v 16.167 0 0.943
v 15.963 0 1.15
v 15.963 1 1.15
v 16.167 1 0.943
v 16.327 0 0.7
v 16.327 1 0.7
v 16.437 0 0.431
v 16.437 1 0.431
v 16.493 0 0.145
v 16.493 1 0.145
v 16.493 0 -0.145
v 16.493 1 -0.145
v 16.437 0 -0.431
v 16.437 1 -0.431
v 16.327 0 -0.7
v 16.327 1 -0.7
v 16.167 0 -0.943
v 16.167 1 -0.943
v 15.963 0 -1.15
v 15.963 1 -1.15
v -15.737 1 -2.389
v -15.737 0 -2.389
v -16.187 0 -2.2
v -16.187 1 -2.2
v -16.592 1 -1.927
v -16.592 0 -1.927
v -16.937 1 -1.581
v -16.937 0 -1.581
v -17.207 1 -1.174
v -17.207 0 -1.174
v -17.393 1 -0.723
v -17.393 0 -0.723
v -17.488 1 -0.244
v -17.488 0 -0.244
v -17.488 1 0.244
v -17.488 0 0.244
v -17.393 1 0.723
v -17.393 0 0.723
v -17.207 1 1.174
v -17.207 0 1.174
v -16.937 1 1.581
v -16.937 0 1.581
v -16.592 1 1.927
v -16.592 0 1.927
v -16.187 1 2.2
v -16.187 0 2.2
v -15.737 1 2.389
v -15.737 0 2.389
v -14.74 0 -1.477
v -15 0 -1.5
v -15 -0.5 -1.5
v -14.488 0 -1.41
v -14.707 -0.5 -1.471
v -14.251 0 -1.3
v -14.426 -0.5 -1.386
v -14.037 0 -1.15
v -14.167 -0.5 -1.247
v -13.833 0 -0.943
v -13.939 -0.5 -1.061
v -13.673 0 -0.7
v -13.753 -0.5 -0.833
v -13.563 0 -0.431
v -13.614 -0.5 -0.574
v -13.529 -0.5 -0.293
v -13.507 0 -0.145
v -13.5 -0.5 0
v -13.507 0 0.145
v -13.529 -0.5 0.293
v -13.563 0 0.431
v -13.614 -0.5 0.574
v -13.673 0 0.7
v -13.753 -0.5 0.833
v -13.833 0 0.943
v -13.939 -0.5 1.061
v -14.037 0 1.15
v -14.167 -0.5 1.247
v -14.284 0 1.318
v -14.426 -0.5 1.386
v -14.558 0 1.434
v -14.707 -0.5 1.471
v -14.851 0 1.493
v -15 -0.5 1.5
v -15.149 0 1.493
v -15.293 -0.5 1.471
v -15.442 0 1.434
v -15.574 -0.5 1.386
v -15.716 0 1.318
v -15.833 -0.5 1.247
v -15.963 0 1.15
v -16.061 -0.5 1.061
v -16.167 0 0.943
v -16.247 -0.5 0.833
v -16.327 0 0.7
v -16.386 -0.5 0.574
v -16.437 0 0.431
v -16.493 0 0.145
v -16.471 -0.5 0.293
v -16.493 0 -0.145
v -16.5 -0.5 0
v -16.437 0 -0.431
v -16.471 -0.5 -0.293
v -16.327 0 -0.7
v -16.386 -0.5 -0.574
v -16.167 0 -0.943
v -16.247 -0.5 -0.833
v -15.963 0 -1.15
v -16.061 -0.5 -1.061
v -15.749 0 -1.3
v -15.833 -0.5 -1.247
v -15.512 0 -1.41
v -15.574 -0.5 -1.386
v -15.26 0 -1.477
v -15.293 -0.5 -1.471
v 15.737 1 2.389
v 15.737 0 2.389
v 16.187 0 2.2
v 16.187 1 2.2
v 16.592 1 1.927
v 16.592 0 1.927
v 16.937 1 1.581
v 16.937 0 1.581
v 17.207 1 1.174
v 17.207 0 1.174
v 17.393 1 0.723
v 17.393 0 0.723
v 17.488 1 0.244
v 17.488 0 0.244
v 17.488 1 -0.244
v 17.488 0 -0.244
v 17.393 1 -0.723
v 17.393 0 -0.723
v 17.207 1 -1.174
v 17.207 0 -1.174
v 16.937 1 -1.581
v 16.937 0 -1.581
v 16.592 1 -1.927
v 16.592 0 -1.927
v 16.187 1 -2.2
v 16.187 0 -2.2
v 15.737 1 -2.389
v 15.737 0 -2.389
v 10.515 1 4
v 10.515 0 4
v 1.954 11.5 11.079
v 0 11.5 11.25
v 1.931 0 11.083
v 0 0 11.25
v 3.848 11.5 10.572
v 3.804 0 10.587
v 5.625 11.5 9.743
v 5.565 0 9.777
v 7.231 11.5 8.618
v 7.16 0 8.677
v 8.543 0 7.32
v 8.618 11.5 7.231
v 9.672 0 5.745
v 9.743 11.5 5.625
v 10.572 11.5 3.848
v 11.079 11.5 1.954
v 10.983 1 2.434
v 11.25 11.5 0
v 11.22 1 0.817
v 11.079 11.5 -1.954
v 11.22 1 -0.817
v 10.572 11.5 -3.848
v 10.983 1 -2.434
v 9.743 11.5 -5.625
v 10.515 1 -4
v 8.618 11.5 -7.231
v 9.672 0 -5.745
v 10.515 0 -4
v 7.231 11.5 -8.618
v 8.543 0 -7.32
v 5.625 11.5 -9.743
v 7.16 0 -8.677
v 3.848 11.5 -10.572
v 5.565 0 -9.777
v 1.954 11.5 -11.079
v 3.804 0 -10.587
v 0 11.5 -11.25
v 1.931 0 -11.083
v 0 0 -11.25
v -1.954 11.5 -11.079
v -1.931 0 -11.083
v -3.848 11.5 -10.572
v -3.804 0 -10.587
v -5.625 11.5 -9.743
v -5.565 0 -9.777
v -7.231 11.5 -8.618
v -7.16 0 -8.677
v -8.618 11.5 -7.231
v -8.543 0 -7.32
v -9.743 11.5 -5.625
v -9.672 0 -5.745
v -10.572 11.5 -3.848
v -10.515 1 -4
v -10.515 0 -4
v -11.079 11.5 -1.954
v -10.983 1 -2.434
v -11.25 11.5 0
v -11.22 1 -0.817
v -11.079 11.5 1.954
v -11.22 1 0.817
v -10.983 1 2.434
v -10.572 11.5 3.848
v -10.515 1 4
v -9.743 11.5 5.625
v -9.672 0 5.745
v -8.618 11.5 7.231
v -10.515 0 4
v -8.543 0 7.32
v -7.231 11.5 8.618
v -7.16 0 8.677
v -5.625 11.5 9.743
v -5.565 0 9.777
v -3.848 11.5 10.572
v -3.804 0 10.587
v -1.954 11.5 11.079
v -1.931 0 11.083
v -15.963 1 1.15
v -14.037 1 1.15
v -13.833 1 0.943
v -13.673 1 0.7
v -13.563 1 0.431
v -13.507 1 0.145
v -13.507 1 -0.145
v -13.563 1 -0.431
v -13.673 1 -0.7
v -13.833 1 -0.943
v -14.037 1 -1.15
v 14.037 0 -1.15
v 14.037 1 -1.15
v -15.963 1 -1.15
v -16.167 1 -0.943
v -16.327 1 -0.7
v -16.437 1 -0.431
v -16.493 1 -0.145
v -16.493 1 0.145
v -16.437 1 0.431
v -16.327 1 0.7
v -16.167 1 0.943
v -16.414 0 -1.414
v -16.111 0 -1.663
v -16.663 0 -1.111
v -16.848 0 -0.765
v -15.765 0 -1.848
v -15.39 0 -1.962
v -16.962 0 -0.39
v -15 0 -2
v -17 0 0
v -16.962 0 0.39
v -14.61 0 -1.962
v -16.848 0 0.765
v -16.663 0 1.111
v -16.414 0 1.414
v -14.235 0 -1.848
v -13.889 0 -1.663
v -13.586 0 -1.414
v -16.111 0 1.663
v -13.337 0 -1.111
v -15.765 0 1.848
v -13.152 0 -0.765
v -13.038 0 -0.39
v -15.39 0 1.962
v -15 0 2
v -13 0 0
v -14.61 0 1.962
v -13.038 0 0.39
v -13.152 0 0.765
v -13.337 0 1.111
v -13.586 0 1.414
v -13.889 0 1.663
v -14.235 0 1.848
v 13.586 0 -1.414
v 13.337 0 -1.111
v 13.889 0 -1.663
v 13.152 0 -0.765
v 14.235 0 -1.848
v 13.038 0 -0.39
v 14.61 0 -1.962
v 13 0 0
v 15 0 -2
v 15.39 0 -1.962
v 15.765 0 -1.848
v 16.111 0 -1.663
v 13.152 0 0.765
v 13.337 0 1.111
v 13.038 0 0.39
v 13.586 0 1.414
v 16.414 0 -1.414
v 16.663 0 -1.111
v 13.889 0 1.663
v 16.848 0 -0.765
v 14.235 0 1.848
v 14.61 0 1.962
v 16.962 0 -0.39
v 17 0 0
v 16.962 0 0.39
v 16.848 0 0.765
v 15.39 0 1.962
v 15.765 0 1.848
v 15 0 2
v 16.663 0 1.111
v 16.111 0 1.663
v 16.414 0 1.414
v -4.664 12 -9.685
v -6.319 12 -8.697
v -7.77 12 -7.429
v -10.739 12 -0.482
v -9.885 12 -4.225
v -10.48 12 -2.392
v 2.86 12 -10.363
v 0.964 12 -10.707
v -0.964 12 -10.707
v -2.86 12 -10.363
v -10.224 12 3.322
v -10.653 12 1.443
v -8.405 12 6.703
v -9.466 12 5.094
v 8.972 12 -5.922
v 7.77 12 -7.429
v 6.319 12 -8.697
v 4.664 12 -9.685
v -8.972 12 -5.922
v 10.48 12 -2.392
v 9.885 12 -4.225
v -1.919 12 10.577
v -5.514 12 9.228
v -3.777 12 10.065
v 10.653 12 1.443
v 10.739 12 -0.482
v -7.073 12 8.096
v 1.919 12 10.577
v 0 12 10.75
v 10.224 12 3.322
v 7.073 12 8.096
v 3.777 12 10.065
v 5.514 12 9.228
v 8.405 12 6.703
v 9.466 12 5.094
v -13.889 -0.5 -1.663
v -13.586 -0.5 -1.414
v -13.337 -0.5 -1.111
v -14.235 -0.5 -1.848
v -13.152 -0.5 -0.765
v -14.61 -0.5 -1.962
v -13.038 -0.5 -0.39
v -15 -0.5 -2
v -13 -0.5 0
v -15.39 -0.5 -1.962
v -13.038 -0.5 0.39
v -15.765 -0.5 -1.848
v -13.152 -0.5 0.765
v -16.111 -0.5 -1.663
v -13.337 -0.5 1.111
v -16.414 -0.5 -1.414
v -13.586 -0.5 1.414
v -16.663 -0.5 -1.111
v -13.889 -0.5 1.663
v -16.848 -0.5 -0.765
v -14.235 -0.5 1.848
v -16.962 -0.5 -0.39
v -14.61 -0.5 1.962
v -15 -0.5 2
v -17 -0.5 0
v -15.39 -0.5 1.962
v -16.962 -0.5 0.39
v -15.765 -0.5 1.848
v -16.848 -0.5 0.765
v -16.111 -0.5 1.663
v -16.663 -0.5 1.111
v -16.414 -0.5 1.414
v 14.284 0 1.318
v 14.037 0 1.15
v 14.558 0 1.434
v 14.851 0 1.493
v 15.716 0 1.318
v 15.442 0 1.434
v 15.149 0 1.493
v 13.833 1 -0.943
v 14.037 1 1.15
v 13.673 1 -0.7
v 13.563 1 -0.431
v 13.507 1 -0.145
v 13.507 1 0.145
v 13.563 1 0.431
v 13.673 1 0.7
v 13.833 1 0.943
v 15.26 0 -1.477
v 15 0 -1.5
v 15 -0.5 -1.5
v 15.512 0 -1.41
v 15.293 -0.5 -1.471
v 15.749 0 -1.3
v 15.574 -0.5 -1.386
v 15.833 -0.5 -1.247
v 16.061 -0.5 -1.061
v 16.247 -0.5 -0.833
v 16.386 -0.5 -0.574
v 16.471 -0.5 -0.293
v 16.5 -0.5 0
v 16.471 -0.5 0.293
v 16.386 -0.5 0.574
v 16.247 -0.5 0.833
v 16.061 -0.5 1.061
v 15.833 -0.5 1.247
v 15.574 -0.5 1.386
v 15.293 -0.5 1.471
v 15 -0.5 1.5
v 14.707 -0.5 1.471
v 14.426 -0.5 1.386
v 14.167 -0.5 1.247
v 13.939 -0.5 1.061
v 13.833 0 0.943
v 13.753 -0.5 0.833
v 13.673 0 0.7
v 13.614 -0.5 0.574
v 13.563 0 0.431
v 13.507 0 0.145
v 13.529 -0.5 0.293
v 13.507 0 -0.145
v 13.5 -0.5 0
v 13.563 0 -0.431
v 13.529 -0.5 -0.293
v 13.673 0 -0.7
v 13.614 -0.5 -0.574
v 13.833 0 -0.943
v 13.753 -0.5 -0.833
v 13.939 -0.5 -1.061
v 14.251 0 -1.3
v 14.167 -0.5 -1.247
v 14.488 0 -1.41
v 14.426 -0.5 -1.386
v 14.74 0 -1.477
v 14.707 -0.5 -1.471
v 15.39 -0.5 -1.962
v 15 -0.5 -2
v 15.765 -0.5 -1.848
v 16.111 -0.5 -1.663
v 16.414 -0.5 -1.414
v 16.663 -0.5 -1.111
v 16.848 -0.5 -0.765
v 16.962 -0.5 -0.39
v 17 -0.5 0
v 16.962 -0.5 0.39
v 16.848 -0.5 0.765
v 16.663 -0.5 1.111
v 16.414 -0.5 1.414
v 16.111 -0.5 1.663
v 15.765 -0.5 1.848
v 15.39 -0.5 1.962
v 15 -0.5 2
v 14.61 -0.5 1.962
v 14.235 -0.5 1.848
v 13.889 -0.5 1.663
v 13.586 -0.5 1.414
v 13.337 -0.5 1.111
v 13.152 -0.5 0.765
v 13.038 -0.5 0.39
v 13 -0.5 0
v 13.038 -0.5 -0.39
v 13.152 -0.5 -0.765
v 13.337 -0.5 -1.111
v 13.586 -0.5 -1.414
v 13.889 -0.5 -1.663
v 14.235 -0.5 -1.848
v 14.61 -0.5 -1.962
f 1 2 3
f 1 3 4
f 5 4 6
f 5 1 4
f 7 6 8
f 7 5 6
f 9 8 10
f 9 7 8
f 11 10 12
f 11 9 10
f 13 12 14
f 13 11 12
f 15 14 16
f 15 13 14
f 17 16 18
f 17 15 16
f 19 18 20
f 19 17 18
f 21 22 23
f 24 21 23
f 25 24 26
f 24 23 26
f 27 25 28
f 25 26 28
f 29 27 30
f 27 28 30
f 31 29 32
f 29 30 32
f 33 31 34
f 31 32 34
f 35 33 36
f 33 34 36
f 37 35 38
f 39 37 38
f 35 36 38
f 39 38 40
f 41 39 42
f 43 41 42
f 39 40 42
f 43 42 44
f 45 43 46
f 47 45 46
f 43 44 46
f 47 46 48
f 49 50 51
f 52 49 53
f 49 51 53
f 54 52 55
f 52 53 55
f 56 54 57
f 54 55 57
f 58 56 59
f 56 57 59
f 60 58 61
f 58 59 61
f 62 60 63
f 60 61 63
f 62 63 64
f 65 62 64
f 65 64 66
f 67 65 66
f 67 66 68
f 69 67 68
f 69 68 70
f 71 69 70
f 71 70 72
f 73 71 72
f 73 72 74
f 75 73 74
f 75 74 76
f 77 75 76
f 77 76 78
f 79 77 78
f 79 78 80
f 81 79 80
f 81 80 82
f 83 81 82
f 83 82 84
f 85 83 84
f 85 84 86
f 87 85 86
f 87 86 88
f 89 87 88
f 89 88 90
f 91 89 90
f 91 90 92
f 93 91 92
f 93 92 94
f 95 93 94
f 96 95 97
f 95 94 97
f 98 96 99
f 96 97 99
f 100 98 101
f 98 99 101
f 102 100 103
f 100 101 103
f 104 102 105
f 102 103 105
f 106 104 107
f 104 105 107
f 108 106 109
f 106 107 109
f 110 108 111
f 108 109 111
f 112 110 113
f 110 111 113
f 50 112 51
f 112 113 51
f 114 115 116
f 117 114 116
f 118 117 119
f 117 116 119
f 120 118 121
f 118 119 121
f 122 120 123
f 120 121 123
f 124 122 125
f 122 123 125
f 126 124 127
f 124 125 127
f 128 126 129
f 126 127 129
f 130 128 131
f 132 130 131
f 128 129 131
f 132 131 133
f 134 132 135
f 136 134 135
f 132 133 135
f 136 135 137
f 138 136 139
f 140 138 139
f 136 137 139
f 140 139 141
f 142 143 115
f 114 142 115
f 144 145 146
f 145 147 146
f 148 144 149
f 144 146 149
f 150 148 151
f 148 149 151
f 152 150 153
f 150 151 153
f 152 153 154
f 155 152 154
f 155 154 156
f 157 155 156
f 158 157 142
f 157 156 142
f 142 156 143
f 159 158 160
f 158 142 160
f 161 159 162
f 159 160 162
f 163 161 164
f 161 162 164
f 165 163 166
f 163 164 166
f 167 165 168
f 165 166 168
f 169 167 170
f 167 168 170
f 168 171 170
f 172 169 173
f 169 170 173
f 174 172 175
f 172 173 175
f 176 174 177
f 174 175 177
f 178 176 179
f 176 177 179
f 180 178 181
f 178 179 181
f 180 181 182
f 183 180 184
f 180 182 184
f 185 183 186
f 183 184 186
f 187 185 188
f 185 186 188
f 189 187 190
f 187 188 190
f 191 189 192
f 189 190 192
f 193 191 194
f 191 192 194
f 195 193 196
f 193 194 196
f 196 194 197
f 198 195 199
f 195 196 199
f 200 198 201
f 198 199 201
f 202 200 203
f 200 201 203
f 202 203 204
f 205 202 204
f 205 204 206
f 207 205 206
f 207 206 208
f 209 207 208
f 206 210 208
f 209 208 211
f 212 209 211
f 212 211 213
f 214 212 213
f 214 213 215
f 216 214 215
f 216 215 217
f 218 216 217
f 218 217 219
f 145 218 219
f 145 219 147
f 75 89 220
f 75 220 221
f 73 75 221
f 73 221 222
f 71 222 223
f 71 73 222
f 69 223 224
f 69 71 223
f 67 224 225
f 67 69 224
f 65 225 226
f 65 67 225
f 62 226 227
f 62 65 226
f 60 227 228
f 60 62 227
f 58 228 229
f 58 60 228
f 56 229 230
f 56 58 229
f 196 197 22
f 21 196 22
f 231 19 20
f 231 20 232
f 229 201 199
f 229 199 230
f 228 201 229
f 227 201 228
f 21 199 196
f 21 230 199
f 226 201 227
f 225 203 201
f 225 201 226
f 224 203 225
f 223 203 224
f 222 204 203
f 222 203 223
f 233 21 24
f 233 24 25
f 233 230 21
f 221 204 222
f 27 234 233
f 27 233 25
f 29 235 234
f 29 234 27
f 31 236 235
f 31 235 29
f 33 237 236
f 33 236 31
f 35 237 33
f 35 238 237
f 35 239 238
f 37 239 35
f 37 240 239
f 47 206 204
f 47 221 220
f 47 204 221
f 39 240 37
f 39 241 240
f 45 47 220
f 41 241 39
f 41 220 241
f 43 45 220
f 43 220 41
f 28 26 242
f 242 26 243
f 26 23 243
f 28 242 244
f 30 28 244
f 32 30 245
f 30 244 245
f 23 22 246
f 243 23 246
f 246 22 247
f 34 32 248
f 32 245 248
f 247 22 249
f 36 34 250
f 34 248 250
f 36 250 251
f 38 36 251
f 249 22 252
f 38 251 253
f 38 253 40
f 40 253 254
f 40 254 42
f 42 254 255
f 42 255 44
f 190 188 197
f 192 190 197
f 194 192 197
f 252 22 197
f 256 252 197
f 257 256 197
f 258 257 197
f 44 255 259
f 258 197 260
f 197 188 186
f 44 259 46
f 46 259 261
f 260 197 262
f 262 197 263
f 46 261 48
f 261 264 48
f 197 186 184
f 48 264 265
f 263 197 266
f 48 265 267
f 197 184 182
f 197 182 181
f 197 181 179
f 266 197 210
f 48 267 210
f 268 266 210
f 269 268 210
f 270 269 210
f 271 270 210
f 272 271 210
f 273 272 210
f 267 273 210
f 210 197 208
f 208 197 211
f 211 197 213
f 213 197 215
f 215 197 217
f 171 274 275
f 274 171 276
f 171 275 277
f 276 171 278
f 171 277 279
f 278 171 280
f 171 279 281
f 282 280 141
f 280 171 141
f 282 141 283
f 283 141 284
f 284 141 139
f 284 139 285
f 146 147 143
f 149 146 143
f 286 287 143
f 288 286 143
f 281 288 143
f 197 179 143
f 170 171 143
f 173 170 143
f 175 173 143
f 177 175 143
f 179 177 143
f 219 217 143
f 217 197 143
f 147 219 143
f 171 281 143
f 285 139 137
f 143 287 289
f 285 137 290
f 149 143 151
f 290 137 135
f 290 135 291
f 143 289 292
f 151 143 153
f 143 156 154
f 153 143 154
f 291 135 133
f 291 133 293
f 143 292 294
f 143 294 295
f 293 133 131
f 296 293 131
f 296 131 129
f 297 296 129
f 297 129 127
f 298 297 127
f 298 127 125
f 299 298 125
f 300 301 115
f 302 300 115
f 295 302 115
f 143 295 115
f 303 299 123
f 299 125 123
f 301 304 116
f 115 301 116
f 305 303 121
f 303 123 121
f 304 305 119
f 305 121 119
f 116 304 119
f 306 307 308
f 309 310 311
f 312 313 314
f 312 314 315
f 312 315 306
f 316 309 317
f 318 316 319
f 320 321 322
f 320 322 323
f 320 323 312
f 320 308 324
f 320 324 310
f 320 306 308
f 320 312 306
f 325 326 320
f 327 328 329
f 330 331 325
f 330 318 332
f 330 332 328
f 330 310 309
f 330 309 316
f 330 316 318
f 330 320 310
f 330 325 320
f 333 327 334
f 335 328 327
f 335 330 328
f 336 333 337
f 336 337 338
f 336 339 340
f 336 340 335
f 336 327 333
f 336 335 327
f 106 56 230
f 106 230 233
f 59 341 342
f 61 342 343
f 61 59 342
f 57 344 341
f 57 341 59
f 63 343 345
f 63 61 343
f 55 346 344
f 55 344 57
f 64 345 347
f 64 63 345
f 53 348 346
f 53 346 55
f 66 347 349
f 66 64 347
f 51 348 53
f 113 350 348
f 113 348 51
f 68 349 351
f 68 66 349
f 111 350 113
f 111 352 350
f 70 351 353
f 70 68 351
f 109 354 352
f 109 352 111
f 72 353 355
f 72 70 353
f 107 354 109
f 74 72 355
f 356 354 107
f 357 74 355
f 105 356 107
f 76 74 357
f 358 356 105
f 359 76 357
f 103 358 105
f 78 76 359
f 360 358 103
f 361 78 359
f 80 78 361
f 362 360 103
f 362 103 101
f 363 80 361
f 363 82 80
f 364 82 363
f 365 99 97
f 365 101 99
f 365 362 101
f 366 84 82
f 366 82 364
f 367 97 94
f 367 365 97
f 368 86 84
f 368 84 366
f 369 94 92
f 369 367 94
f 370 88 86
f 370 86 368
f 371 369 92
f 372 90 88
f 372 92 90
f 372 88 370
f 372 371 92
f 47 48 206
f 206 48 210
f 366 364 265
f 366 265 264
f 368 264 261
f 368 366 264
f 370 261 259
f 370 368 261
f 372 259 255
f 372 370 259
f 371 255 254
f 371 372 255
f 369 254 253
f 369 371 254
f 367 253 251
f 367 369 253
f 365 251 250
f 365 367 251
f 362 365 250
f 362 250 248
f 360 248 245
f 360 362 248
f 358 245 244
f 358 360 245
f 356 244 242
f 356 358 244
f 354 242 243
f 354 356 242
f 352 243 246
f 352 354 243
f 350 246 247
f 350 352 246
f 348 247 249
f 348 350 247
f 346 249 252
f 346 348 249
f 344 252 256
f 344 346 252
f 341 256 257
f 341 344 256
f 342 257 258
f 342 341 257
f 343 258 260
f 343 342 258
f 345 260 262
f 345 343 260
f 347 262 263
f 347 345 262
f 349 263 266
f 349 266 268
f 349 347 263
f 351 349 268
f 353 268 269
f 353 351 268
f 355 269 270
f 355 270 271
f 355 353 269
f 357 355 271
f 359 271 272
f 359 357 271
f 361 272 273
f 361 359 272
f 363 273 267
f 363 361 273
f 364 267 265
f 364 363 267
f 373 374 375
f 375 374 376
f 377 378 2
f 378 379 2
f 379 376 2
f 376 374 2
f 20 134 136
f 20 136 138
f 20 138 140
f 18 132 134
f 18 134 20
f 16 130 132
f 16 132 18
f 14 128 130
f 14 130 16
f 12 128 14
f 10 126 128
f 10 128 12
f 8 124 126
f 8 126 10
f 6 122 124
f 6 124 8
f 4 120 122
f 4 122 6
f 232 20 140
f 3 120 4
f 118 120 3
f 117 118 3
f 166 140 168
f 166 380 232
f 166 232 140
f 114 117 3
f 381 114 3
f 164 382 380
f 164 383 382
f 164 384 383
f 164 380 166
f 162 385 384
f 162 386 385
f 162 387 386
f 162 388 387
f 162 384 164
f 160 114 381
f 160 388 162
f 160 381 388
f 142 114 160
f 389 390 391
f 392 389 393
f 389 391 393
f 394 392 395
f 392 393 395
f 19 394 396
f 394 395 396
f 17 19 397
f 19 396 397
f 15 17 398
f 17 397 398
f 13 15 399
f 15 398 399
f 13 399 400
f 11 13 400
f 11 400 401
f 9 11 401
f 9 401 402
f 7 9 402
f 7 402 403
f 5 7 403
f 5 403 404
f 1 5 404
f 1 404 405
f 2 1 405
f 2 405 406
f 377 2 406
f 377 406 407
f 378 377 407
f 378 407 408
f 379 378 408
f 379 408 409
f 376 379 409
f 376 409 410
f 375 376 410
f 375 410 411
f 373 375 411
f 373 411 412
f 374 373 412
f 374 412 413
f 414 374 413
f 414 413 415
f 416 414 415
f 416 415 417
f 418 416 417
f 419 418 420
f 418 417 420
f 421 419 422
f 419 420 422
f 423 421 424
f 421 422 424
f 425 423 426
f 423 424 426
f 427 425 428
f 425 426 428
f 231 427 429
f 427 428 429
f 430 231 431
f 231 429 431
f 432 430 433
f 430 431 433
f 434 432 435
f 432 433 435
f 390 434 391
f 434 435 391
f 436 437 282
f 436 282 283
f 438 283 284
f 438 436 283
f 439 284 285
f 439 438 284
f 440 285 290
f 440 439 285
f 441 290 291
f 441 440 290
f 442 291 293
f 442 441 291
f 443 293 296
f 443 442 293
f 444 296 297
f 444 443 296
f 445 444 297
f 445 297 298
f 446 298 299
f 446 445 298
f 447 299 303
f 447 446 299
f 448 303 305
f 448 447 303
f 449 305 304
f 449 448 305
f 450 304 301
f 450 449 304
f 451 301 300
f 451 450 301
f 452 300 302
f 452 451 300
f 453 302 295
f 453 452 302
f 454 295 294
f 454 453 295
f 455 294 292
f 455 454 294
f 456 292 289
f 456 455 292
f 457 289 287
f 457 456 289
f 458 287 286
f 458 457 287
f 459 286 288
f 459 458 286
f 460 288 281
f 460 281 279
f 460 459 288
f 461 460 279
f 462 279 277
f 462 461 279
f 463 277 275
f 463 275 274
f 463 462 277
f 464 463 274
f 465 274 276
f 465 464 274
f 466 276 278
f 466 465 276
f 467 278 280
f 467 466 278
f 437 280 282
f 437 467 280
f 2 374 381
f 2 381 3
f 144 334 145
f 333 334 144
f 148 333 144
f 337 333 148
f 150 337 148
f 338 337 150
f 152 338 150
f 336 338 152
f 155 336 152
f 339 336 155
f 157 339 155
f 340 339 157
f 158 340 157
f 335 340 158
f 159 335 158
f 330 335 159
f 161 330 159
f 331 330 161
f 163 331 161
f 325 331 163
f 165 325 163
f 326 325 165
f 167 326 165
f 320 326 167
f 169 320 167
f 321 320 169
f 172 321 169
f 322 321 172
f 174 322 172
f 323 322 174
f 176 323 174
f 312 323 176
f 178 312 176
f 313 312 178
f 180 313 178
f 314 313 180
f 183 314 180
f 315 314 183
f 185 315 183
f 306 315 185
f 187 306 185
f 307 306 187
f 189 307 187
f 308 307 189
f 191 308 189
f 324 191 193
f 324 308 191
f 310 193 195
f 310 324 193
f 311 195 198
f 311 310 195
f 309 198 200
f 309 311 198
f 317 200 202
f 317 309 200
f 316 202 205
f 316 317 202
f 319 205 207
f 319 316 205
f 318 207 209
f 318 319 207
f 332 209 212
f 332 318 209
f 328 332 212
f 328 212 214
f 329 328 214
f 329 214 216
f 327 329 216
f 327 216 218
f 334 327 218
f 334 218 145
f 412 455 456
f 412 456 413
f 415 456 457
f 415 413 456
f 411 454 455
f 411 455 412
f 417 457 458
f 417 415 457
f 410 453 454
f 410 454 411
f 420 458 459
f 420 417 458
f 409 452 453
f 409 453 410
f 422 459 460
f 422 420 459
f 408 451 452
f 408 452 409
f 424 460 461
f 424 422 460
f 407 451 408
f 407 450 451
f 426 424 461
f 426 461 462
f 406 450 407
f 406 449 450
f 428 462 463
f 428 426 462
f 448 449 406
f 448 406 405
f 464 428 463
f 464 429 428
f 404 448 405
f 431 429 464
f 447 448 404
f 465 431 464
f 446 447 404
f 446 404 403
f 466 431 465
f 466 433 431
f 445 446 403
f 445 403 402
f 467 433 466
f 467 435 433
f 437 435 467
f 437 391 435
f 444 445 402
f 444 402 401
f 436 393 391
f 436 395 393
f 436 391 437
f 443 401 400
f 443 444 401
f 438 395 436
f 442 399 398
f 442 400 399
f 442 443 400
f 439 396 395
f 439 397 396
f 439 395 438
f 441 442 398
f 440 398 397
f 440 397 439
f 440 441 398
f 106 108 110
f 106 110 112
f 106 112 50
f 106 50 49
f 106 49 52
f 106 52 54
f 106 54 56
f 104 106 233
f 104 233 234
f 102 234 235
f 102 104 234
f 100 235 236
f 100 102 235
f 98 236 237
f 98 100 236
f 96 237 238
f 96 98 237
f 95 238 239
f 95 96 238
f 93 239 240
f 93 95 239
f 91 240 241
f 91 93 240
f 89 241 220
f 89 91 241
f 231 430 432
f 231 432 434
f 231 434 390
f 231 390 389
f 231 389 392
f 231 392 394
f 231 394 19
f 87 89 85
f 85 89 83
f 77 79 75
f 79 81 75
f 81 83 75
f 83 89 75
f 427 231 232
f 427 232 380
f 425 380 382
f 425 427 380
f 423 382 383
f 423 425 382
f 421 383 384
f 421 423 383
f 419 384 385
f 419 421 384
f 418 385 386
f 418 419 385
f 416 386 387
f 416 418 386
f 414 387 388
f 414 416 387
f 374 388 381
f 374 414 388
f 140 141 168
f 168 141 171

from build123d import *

# Parameters (mm, degrees)
SKETCH1_R           = 11.25
BOSS_EXTRUDE1_DEPTH = 12
CHAMFER1_SIZE       = 0.5
BOSS_EXTRUDE2_DEPTH = 1
BOSS_EXTRUDE3_START = 0.5
SKETCH3_R           = 2
SKETCH3_R_2         = 1.5
BOSS_EXTRUDE3_DEPTH = 0.5


with BuildPart() as part:
    # Sketch1 → Boss-Extrude1 (new body)
    with BuildSketch(Plane(origin=(0, 0, 0), x_dir=(1, 0, 0), z_dir=(0, 1, 0))):
        with Locations(Location((0, 0, 0), (0, 0, 270))):
            Circle(SKETCH1_R)
    extrude(amount=BOSS_EXTRUDE1_DEPTH)

    # Chamfer1
    chamfer1_edges = [part.edges().sort_by_distance(p)[0] for p in [
        (0, 12, -11.25),
    ]]
    chamfer(chamfer1_edges, length=CHAMFER1_SIZE)

    # Sketch2 → Boss-Extrude2 (add)
    # profile 1 of 2: a face of its own
    with BuildSketch(Plane.XZ):
        with BuildLine():
            Line((-15.737008616, 2.388894786), (-10.514870422, 4))
            ThreePointArc((-10.514870422, 4), (-11.25, 0), (-10.514870422, -4))
            Line((-10.514870422, -4), (-15.737008616, -2.388894786))
            ThreePointArc((-15.737008616, -2.388894786), (-17.5, 0), (-15.737008616, 2.388894786))
        make_face()
        with BuildLine():
            Line((-15.963068014, 1.15), (-14.036931986, 1.15))
            ThreePointArc((-14.036931986, 1.15), (-13.5, 0), (-14.036931986, -1.15))
            Line((-14.036931986, -1.15), (-15.963068014, -1.15))
            ThreePointArc((-15.963068014, -1.15), (-16.5, 0), (-15.963068014, 1.15))
        make_face(mode=Mode.SUBTRACT)
    # profile 2 of 2: a face of its own
    with BuildSketch(Plane.XZ):
        with BuildLine():
            Line((15.737008616, -2.388894786), (10.514870422, -4))
            ThreePointArc((10.514870422, -4), (11.25, 0), (10.514870422, 4))
            Line((10.514870422, 4), (15.737008616, 2.388894786))
            ThreePointArc((15.737008616, 2.388894786), (17.5, 0), (15.737008616, -2.388894786))
        make_face()
        with BuildLine():
            Line((14.036931986, 1.15), (15.963068014, 1.15))
            ThreePointArc((15.963068014, 1.15), (16.5, 0), (15.963068014, -1.15))
            Line((15.963068014, -1.15), (14.036931986, -1.15))
            ThreePointArc((14.036931986, -1.15), (13.5, 0), (14.036931986, 1.15))
        make_face(mode=Mode.SUBTRACT)
    extrude(amount=-BOSS_EXTRUDE2_DEPTH)

    # Sketch3 → Boss-Extrude3 (add)
    # profile 1 of 2: a face of its own
    with BuildSketch(Plane.XZ.offset(BOSS_EXTRUDE3_START)):
        with Locations(Location((15, 0, 0), (0, 0, 270))):
            Circle(SKETCH3_R)
        with Locations(Location((15, 0, 0), (0, 0, 270))):
            Circle(SKETCH3_R_2, mode=Mode.SUBTRACT)
    # profile 2 of 2: a face of its own
    with BuildSketch(Plane.XZ.offset(BOSS_EXTRUDE3_START)):
        with Locations(Location((-15, 0, 0), (0, 0, 90))):
            Circle(SKETCH3_R)
        with Locations(Location((-15, 0, 0), (0, 0, 270))):
            Circle(SKETCH3_R_2, mode=Mode.SUBTRACT)
    extrude(amount=-BOSS_EXTRUDE3_DEPTH)


solid = part.part
